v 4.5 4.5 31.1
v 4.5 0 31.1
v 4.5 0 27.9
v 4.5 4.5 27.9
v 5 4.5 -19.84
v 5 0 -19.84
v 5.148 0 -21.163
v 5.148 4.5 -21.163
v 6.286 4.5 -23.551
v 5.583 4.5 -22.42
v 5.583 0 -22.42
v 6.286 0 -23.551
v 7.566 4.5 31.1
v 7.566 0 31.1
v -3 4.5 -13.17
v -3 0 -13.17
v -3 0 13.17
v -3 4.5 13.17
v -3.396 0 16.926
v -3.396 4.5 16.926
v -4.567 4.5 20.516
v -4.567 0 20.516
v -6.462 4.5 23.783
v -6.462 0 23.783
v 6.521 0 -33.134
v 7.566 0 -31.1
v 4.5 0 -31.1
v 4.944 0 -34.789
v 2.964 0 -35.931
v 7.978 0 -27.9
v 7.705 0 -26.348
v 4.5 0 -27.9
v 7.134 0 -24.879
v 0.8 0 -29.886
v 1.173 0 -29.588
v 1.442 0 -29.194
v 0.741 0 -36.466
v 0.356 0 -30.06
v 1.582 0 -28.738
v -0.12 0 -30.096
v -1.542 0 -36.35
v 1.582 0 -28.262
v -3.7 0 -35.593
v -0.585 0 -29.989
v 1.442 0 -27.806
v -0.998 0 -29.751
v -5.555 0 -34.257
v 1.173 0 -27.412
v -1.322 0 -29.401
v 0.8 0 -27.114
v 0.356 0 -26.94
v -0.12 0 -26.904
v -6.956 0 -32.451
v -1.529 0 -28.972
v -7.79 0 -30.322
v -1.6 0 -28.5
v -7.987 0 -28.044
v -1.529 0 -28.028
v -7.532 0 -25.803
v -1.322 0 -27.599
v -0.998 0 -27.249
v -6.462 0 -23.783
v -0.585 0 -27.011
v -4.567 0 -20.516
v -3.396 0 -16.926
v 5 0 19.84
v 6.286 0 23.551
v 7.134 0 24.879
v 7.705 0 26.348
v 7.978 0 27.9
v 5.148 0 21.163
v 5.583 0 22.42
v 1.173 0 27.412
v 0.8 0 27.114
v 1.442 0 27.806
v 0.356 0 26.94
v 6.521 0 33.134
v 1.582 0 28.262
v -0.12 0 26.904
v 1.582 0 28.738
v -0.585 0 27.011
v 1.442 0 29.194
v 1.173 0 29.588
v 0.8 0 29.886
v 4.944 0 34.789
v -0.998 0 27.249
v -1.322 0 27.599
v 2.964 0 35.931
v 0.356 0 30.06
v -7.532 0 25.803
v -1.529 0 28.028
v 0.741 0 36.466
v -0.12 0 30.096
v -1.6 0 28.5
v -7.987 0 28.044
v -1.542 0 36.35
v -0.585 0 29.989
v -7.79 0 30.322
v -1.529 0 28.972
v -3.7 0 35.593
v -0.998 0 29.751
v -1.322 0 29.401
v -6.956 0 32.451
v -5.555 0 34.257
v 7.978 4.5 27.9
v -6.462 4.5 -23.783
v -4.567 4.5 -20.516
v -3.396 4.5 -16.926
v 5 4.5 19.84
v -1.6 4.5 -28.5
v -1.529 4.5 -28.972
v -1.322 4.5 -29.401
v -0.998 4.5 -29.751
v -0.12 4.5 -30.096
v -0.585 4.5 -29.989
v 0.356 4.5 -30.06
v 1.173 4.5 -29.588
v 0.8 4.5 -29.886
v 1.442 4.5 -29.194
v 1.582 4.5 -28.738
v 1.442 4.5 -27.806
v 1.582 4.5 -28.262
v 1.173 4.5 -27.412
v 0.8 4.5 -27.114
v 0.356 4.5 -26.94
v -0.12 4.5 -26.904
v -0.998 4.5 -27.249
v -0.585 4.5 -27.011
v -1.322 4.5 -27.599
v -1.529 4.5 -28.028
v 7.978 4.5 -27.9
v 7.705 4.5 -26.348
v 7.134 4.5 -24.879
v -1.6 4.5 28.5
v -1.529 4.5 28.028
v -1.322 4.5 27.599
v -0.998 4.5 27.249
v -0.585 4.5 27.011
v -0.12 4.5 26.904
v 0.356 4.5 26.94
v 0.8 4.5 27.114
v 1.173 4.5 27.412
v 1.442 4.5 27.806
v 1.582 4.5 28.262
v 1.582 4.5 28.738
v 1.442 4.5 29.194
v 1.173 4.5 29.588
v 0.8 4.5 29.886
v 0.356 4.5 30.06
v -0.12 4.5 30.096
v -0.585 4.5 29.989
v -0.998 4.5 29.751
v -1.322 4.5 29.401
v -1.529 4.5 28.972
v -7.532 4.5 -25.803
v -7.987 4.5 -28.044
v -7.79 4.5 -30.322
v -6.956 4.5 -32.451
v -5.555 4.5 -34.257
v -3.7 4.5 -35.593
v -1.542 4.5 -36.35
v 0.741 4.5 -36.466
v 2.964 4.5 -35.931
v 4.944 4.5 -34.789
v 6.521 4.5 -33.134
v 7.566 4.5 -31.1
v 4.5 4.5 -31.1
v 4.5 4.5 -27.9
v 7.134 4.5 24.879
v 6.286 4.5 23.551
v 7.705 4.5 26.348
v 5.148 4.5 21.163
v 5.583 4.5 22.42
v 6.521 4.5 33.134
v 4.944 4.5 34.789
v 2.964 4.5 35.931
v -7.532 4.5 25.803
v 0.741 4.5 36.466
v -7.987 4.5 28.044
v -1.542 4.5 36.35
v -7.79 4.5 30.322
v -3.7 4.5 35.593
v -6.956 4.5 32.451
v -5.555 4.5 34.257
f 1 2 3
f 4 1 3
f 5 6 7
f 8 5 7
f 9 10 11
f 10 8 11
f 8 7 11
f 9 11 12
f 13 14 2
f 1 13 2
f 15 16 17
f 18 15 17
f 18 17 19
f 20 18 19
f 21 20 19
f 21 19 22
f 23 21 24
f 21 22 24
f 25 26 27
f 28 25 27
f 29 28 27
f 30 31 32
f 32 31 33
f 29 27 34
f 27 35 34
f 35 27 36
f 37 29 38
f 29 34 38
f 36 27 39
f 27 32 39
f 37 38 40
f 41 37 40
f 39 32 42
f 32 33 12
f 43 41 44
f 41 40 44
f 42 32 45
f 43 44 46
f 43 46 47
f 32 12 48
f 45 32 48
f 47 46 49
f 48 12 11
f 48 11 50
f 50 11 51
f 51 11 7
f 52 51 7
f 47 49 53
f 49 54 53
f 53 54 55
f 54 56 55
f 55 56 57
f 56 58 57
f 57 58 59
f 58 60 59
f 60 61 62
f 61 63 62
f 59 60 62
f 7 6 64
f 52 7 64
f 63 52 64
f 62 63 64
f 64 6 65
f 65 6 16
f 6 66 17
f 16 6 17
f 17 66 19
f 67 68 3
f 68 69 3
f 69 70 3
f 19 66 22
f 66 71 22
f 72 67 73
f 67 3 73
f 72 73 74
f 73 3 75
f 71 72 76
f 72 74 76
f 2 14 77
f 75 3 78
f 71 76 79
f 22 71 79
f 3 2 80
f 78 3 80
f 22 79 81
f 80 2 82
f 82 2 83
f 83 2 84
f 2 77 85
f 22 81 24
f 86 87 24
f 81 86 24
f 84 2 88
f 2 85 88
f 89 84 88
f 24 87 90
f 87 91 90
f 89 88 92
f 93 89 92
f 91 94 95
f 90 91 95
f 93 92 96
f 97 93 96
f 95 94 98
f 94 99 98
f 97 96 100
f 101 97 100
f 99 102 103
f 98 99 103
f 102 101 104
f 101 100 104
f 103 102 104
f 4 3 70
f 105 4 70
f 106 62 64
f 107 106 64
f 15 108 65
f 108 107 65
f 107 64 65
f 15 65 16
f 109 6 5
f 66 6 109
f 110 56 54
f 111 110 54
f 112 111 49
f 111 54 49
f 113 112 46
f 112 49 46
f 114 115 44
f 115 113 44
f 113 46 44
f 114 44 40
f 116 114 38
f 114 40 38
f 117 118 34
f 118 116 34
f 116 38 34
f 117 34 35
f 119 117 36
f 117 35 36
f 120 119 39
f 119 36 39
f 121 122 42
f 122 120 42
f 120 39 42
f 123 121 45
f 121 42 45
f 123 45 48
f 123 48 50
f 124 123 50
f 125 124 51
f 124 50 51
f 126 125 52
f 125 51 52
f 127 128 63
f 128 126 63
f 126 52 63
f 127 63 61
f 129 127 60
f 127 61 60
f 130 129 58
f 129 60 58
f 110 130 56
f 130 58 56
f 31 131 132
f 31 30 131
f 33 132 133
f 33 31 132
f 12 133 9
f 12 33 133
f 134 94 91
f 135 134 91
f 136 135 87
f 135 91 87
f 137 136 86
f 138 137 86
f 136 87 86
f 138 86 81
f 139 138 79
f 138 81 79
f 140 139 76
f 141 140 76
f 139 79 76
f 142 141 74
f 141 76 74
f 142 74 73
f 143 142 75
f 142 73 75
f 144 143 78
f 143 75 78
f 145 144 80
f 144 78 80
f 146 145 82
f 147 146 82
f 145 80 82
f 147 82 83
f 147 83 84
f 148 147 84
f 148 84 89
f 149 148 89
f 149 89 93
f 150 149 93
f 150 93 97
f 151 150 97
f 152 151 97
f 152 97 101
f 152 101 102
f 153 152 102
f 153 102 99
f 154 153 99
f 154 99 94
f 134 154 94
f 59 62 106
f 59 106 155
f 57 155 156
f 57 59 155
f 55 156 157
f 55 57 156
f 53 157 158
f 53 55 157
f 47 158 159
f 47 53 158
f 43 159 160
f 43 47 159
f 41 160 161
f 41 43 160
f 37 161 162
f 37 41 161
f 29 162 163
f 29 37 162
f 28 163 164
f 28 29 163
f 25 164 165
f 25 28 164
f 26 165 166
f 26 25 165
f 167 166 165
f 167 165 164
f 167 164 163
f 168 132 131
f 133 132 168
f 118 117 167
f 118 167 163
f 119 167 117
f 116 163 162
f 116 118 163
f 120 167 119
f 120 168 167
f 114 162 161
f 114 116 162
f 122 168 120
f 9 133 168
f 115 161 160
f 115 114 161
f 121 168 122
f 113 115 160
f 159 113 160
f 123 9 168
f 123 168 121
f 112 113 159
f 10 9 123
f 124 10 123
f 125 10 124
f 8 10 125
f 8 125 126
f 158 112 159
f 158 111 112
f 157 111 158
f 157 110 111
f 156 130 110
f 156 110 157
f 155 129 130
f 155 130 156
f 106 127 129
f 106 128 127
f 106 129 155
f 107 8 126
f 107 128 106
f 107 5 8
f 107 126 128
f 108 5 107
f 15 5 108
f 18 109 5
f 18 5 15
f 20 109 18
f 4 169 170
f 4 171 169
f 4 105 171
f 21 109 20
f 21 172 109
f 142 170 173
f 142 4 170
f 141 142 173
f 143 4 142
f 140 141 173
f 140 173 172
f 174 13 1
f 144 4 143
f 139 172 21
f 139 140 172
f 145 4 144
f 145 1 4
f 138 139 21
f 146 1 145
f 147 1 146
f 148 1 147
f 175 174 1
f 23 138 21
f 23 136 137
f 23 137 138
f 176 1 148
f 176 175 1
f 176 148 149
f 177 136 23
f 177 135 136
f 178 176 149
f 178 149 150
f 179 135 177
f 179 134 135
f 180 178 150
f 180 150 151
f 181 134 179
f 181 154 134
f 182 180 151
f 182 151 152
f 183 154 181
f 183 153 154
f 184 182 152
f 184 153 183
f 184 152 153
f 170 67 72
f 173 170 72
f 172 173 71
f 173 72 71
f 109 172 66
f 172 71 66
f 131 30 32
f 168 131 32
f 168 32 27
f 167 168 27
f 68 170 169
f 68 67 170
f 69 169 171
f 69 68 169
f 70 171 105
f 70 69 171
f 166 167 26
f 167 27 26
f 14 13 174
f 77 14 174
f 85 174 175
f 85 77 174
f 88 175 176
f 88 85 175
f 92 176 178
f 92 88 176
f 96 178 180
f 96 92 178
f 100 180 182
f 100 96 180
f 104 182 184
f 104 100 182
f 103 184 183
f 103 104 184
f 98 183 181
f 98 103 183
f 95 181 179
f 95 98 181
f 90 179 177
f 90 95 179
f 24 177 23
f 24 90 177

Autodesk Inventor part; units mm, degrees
ref_plane "YZ Plane" through (0, 0, 0) normal (1, 0, 0) x (0, 1, 0)
ref_plane "XZ Plane" through (0, 0, 0) normal (0, 1, 0) x (-1, 0, 0)
ref_plane "XY Plane" through (0, 0, 0) normal (0, 0, 1) x (1, 0, 0)
sketch "Sketch2" plane through (0, 0, 0) normal (0, 1, 0) x (-1, 0, 0)
  line L0 (3, -13.1703) -> (3, 0)
  line L1 (-7.9775, -27.9) -> (-4.5, -27.9)
  line L2 (-4.5, -27.9) -> (-4.5, -31.1)
  line L3 (-4.5, -31.1) -> (-7.5657, -31.1)
  circle A0 centre (0, -28.5) radius 1.6
  line L4 (-5, -19.8397) -> (-5, 0)
  arc A1 (-6.2857, -23.5513) -> (-7.9775, -27.9) centre (0, -28.5) ccw
  arc A2 (-7.5657, -31.1) -> (6.4615, -23.7832) centre (0, -28.5) ccw
  line L5 (62.6119, 0) -> (-52.77, 0)
  arc A3 (3, -13.1703) -> (6.4615, -23.7832) centre (21, -13.1703) ccw
  line L6 (3, 0) -> (-5, 0)
  arc A4 (-6.2857, -23.5513) -> (-5, -19.8397) centre (-11, -19.8397) ccw
  point P0 (0, 0)
  point P1 (0, 0)
  point P2 (-5, -22.255)
  point P3 (3, -21.0838)
  dimension "d3" = 0.6
  dimension "d4" = 3.2
  dimension "d5" = 3.2
  dimension "d6" = 4.5
  dimension "d8" = 57
  dimension "d9" = 3
  dimension "d10" = 5
  dimension "d11" = 8
  dimension "d12" = 18
  dimension "d15" = 6
extrude "Extrusion1" add sketch "Sketch2" along normal blind 4.5
mirror "Mirror1" about plane through (0, 0, 0) normal (0, 0, 1) of "Extrusion1"
properties part number "Spacer2"
